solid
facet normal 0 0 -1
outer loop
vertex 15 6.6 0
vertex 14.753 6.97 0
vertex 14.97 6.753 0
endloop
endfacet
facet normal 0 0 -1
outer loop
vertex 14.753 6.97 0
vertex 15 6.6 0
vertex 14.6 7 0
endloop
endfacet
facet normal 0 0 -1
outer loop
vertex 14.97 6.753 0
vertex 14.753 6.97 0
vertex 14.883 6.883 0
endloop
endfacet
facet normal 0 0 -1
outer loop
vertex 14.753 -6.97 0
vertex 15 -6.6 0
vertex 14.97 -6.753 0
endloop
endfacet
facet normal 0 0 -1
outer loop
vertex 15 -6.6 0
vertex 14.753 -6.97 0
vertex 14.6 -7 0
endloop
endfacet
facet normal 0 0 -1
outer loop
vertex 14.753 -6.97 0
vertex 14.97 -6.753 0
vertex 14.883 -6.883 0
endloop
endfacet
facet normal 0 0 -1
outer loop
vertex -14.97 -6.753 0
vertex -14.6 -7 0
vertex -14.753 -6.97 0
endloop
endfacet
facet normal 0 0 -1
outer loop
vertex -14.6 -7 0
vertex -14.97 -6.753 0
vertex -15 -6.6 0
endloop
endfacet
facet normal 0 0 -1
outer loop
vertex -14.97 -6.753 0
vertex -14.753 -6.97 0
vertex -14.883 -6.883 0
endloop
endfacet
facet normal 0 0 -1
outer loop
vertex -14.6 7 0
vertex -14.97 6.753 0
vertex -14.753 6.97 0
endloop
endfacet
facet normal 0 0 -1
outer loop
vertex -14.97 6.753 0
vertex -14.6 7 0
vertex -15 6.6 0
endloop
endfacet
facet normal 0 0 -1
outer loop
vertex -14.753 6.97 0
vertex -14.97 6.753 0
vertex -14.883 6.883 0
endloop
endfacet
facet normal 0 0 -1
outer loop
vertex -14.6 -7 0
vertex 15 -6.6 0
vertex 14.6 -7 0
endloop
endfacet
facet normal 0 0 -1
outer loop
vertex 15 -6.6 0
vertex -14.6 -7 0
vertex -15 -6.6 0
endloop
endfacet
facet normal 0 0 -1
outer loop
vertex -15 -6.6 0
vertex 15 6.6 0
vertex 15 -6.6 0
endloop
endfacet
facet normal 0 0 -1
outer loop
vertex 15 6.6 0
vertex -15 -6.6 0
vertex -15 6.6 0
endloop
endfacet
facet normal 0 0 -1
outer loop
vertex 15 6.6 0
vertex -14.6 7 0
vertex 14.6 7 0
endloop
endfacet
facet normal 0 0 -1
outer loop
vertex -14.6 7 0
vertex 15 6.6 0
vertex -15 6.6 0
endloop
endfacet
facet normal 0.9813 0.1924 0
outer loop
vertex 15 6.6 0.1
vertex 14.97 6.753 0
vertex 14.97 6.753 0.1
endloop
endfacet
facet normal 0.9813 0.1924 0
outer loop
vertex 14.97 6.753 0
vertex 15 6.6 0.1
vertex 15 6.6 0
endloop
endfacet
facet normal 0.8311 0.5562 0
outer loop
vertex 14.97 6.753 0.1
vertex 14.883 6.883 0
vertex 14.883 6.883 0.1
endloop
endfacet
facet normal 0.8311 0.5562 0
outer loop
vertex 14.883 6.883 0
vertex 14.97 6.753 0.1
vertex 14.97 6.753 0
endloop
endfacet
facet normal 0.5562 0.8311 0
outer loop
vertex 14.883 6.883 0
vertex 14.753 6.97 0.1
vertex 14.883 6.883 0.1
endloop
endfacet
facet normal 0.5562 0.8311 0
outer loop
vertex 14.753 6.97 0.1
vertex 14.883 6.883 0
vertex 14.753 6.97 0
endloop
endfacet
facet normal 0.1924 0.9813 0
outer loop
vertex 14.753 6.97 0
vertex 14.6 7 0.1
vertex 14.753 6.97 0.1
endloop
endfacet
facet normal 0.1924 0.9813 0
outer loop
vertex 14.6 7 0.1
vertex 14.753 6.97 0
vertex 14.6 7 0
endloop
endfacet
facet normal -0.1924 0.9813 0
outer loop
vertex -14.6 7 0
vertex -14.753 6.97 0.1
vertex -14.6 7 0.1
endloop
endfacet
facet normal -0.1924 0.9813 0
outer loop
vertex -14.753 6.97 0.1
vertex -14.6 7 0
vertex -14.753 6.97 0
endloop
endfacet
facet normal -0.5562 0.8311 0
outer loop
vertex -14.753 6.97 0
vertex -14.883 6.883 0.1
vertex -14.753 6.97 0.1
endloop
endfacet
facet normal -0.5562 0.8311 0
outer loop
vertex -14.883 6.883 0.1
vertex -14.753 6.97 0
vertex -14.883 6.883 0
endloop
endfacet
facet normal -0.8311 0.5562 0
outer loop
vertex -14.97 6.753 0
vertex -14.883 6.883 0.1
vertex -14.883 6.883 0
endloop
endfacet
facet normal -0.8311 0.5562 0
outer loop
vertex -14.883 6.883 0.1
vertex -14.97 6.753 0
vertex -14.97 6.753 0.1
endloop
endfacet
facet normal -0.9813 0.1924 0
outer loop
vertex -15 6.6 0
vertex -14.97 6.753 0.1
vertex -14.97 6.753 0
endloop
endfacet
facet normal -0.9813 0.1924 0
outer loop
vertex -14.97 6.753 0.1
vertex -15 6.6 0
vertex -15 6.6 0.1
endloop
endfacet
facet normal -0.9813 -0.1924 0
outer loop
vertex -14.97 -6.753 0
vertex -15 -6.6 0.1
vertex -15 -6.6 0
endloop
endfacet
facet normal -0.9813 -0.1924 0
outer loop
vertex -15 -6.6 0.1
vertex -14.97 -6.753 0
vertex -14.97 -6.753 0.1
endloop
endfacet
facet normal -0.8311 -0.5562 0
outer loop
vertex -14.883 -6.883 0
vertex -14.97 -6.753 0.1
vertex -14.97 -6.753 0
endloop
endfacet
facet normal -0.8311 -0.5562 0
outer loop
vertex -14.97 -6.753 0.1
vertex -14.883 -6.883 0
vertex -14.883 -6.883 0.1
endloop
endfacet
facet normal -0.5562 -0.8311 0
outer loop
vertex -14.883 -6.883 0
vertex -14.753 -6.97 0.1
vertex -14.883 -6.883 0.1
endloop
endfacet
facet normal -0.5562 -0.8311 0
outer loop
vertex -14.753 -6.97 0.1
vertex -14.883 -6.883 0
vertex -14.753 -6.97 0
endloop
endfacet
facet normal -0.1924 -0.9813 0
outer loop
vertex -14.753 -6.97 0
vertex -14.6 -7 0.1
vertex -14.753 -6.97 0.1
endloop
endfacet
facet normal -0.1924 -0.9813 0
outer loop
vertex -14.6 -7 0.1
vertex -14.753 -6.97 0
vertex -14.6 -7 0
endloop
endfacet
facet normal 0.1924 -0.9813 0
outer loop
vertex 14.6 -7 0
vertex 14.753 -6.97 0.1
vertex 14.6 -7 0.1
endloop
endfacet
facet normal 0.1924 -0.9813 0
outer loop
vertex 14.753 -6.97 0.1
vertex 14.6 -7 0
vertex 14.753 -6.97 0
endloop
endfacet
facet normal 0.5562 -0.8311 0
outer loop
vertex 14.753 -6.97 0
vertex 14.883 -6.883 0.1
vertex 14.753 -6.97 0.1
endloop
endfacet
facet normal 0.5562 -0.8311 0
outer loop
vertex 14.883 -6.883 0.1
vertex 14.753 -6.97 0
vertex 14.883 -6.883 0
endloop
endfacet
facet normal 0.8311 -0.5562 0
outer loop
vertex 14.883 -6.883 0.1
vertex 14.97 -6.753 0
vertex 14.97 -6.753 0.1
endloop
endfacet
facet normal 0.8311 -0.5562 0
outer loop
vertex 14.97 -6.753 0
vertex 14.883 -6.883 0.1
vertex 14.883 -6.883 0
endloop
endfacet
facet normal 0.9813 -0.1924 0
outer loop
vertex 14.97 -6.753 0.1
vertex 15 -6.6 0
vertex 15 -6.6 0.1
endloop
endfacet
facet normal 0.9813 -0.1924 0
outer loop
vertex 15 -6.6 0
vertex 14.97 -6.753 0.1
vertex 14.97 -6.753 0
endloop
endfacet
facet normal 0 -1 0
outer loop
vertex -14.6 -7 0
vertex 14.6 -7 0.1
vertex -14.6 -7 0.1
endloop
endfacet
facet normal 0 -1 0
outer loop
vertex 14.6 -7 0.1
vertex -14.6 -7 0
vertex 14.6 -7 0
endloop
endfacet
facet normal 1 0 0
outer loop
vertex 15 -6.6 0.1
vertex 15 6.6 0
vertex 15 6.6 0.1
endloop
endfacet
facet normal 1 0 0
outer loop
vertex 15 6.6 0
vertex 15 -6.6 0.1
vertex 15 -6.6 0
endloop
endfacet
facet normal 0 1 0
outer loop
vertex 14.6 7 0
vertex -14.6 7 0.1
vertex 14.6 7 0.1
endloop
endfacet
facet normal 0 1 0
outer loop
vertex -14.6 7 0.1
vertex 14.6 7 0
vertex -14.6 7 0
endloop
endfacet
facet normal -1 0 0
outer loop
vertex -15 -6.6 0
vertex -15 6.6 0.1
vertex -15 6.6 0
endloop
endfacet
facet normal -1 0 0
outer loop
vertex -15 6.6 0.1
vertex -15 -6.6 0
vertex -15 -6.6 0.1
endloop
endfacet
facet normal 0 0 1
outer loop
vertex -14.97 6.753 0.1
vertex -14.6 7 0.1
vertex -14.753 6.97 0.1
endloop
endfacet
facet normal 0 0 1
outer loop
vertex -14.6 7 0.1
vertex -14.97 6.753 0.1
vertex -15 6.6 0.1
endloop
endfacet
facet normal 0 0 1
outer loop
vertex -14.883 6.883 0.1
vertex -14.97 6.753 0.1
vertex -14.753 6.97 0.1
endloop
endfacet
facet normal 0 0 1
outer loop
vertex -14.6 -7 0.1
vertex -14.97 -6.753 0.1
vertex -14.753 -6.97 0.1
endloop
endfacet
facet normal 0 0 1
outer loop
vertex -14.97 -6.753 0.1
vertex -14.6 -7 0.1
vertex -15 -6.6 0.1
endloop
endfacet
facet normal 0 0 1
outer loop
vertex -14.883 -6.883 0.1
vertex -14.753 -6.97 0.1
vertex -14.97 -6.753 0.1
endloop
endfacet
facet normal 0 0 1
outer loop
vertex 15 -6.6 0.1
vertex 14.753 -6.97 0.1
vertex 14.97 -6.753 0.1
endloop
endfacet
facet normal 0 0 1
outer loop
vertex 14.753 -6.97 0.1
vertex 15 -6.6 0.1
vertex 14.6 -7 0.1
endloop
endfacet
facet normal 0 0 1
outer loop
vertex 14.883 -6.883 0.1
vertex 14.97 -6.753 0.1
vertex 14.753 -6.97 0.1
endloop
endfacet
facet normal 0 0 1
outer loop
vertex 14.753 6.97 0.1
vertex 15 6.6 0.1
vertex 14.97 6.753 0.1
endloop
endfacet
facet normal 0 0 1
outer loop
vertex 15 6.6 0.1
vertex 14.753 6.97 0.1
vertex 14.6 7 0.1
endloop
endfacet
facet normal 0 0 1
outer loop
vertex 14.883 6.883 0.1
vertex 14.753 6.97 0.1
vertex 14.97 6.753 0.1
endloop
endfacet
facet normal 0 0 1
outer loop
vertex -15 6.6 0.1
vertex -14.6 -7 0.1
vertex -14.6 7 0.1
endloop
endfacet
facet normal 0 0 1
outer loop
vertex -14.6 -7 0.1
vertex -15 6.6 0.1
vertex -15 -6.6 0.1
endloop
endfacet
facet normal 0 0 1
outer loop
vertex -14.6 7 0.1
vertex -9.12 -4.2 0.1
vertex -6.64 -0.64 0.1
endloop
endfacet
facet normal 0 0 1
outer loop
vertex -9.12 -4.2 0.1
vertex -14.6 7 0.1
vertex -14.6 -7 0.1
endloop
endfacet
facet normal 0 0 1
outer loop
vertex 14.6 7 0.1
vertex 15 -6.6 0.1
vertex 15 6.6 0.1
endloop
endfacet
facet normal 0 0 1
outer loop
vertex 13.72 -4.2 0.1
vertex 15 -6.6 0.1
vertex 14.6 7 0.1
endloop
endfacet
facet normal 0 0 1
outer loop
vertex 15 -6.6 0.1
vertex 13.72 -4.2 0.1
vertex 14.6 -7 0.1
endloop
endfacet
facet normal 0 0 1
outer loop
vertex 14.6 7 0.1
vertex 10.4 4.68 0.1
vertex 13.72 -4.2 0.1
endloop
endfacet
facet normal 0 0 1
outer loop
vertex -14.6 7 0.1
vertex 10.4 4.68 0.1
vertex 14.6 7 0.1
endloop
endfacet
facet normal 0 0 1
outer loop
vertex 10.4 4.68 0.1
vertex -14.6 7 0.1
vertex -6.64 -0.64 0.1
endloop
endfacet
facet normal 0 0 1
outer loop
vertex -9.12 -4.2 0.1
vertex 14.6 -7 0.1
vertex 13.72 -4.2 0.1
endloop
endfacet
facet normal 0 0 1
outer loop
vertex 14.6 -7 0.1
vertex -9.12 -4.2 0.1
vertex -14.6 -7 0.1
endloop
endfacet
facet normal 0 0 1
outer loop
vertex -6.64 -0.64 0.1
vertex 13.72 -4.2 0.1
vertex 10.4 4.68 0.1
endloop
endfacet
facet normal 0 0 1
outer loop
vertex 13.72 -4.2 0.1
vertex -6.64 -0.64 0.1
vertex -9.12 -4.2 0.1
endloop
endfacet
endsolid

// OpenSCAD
// file: ../p/1-4cyli.scad
use <../lib.scad>
function ldraw_lib__1_4cyli() = [
// 0 Cylinder 0.25
// 0 Name: 1-4cyli.dat
// 0 Author: James Jessiman
// 0 !LDRAW_ORG Primitive UPDATE 2012-01
// 0 !LICENSE Licensed under CC BY 4.0 : see CAreadme.txt
// 
// 0 BFC CERTIFY CCW
  [0,"BFC","CERTIFY"],
  [0,"BFC","CCW"],
// 
// 0 !HISTORY 2002-03-23 [sbliss] Added BFC statement.
// 0 !HISTORY 2002-04-25 [PTadmin] Official Update 2002-02
// 0 !HISTORY 2007-06-22 [PTadmin] Header formatted for Contributor Agreement
// 0 !HISTORY 2008-07-01 [PTadmin] Official Update 2008-01
// 0 !HISTORY 2012-02-16 [Philo] Changed to CCW
// 0 !HISTORY 2012-03-30 [PTadmin] Official Update 2012-01
// 
// 
// 4 16 1 1 0 0.9239 1 0.3827 0.9239 0 0.3827 1 0 0
  [4,16,1,1,0,0.9239,1,0.3827,0.9239,0,0.3827,1,0,0],
// 5 24 1 0 0 1 1 0 0.9239 0 0.3827 1 0 -1
  [5,24,1,0,0,1,1,0,0.9239,0,0.3827,1,0,-1],
// 4 16 0.9239 1 0.3827 0.7071 1 0.7071 0.7071 0 0.7071 0.9239 0 0.3827
  [4,16,0.9239,1,0.3827,0.7071,1,0.7071,0.7071,0,0.7071,0.9239,0,0.3827],
// 5 24 0.9239 0 0.3827 0.9239 1 0.3827 0.7071 0 0.7071 1 0 0
  [5,24,0.9239,0,0.3827,0.9239,1,0.3827,0.7071,0,0.7071,1,0,0],
// 4 16 0.7071 1 0.7071 0.3827 1 0.9239 0.3827 0 0.9239 0.7071 0 0.7071
  [4,16,0.7071,1,0.7071,0.3827,1,0.9239,0.3827,0,0.9239,0.7071,0,0.7071],
// 5 24 0.7071 0 0.7071 0.7071 1 0.7071 0.3827 0 0.9239 0.9239 0 0.3827
  [5,24,0.7071,0,0.7071,0.7071,1,0.7071,0.3827,0,0.9239,0.9239,0,0.3827],
// 4 16 0.3827 1 0.9239 0 1 1 0 0 1 0.3827 0 0.9239
  [4,16,0.3827,1,0.9239,0,1,1,0,0,1,0.3827,0,0.9239],
// 5 24 0.3827 0 0.9239 0.3827 1 0.9239 0 0 1 0.7071 0 0.7071
  [5,24,0.3827,0,0.9239,0.3827,1,0.9239,0,0,1,0.7071,0,0.7071],
// 5 24 0 0 1 0 1 1 0.3827 0 0.9239 -1 0 1
  [5,24,0,0,1,0,1,1,0.3827,0,0.9239,-1,0,1],
];
module ldraw_lib__1_4cyli(step=0, col=false, unit=2/5, alt=false, line=0.2, solid=!$preview)
    makepoly(ldraw_lib__1_4cyli(), step=step, col=col, unit=unit, alt=alt, line=line, solid=solid);
ldraw_lib__1_4cyli(line=0.2);
// file: ../p/1-4chrd.scad
use <../lib.scad>
function ldraw_lib__1_4chrd() = [
// 0 Chord 0.25
// 0 Name: 1-4chrd.dat
// 0 Author: Max Martin Richter [MMR1988]
// 0 !LDRAW_ORG Primitive UPDATE 2023-05
// 0 !LICENSE Licensed under CC BY 4.0 : see CAreadme.txt
// 
// 0 BFC CERTIFY CCW
  [0,"BFC","CERTIFY"],
  [0,"BFC","CCW"],
// 
// 0 !HISTORY 2004-04-22 [PTadmin] Official Update 2004-02
// 0 !HISTORY 2007-10-09 [PTadmin] Header formatted for Contributor Agreement
// 0 !HISTORY 2008-07-01 [PTadmin] Official Update 2008-01
// 0 !HISTORY 2012-08-02 [MMR1988] Re-creation with PrimGen2 and Rectifier
// 0 !HISTORY 2012-08-09 [PTadmin] Official Update 2012-02
// 0 !HISTORY 2023-10-27 [OrionP] Change author to MMR1988 from hafhead
// 0 !HISTORY 2023-10-31 [OrionP] Official Update 2023-05
// 
// 4 16 0.9239 0 0.3827 0.3827 0 0.9239 0 0 1 1 0 0
  [4,16,0.9239,0,0.3827,0.3827,0,0.9239,0,0,1,1,0,0],
// 3 16 0.7071 0 0.7071 0.3827 0 0.9239 0.9239 0 0.3827
  [3,16,0.7071,0,0.7071,0.3827,0,0.9239,0.9239,0,0.3827],
];
module ldraw_lib__1_4chrd(step=0, col=false, unit=2/5, alt=false, line=0.2, solid=!$preview)
    makepoly(ldraw_lib__1_4chrd(), step=step, col=col, unit=unit, alt=alt, line=line, solid=solid);
ldraw_lib__1_4chrd(line=0.2);
// main file
use <../lib.scad>
use <../p/1-4chrd.scad>
use <../p/1-4cyli.scad>
function ldraw_lib__6347356m() = [
// 0 Sticker  1.7 x  3.7 with Bright Light Orange Trapezoid Left
// 0 Name: 6347356m.dat
// 0 Author: Evert-Jan Boer [ejboer]
// 0 !LDRAW_ORG Part UPDATE 2024-06
// 0 !LICENSE Licensed under CC BY 4.0 : see CAreadme.txt
// 
// 0 BFC CERTIFY CCW
  [0,"BFC","CERTIFY"],
  [0,"BFC","CCW"],
// 
// 0 !KEYWORDS Republic Gunship, Set 75309, Star Wars
// 
// 0 !HISTORY 2024-07-29 [OrionP] Official Update 2024-06
// 
// 1 16 36.5 0 16.5 1 0 0 0 -1 0 0 0 1 1-4chrd.dat
  [1,16,36.5,0,16.5,1,0,0,0,-1,0,0,0,1, ldraw_lib__1_4chrd()],
// 1 16 36.5 0 -16.5 0 0 1 0 -1 0 -1 0 0 1-4chrd.dat
  [1,16,36.5,0,-16.5,0,0,1,0,-1,0,-1,0,0, ldraw_lib__1_4chrd()],
// 1 16 -36.5 0 -16.5 -1 0 0 0 -1 0 0 0 -1 1-4chrd.dat
  [1,16,-36.5,0,-16.5,-1,0,0,0,-1,0,0,0,-1, ldraw_lib__1_4chrd()],
// 1 16 -36.5 0 16.5 0 0 -1 0 -1 0 1 0 0 1-4chrd.dat
  [1,16,-36.5,0,16.5,0,0,-1,0,-1,0,1,0,0, ldraw_lib__1_4chrd()],
// 4 16 36.5 0 -17.5 -36.5 0 -17.5 -37.5 0 -16.5 37.5 0 -16.5
  [4,16,36.5,0,-17.5,-36.5,0,-17.5,-37.5,0,-16.5,37.5,0,-16.5],
// 4 16 37.5 0 16.5 37.5 0 -16.5 -37.5 0 -16.5 -37.5 0 16.5
  [4,16,37.5,0,16.5,37.5,0,-16.5,-37.5,0,-16.5,-37.5,0,16.5],
// 4 16 37.5 0 16.5 -37.5 0 16.5 -36.5 0 17.5 36.5 0 17.5
  [4,16,37.5,0,16.5,-37.5,0,16.5,-36.5,0,17.5,36.5,0,17.5],
// 
// 1 16 36.5 -.25 16.5 1 0 0 0 .25 0 0 0 1 1-4cyli.dat
  [1,16,36.5,-.25,16.5,1,0,0,0,.25,0,0,0,1, ldraw_lib__1_4cyli()],
// 1 16 -36.5 -.25 16.5 0 0 -1 0 .25 0 1 0 0 1-4cyli.dat
  [1,16,-36.5,-.25,16.5,0,0,-1,0,.25,0,1,0,0, ldraw_lib__1_4cyli()],
// 1 16 -36.5 -.25 -16.5 -1 0 0 0 .25 0 0 0 -1 1-4cyli.dat
  [1,16,-36.5,-.25,-16.5,-1,0,0,0,.25,0,0,0,-1, ldraw_lib__1_4cyli()],
// 1 16 36.5 -.25 -16.5 0 0 1 0 .25 0 -1 0 0 1-4cyli.dat
  [1,16,36.5,-.25,-16.5,0,0,1,0,.25,0,-1,0,0, ldraw_lib__1_4cyli()],
// 4 16 36.5 -.25 -17.5 -36.5 -.25 -17.5 -36.5 0 -17.5 36.5 0 -17.5
  [4,16,36.5,-.25,-17.5,-36.5,-.25,-17.5,-36.5,0,-17.5,36.5,0,-17.5],
// 4 16 37.5 -.25 16.5 37.5 -.25 -16.5 37.5 0 -16.5 37.5 0 16.5
  [4,16,37.5,-.25,16.5,37.5,-.25,-16.5,37.5,0,-16.5,37.5,0,16.5],
// 4 16 -36.5 -.25 17.5 36.5 -.25 17.5 36.5 0 17.5 -36.5 0 17.5
  [4,16,-36.5,-.25,17.5,36.5,-.25,17.5,36.5,0,17.5,-36.5,0,17.5],
// 4 16 -37.5 -.25 -16.5 -37.5 -.25 16.5 -37.5 0 16.5 -37.5 0 -16.5
  [4,16,-37.5,-.25,-16.5,-37.5,-.25,16.5,-37.5,0,16.5,-37.5,0,-16.5],
// 
// 1 16 -36.5 -.25 16.5 0 0 -1 0 1 0 1 0 0 1-4chrd.dat
  [1,16,-36.5,-.25,16.5,0,0,-1,0,1,0,1,0,0, ldraw_lib__1_4chrd()],
// 1 16 -36.5 -.25 -16.5 -1 0 0 0 1 0 0 0 -1 1-4chrd.dat
  [1,16,-36.5,-.25,-16.5,-1,0,0,0,1,0,0,0,-1, ldraw_lib__1_4chrd()],
// 1 16 36.5 -.25 -16.5 0 0 1 0 1 0 -1 0 0 1-4chrd.dat
  [1,16,36.5,-.25,-16.5,0,0,1,0,1,0,-1,0,0, ldraw_lib__1_4chrd()],
// 1 16 36.5 -.25 16.5 1 0 0 0 1 0 0 0 1 1-4chrd.dat
  [1,16,36.5,-.25,16.5,1,0,0,0,1,0,0,0,1, ldraw_lib__1_4chrd()],
// 4 16 -36.5 -.25 -17.5 -36.5 -.25 17.5 -37.5 -.25 16.5 -37.5 -.25 -16.5
  [4,16,-36.5,-.25,-17.5,-36.5,-.25,17.5,-37.5,-.25,16.5,-37.5,-.25,-16.5],
// 4 16 -16.6 -.25 -1.6 -36.5 -.25 17.5 -36.5 -.25 -17.5 -22.8 -.25 -10.5
  [4,16,-16.6,-.25,-1.6,-36.5,-.25,17.5,-36.5,-.25,-17.5,-22.8,-.25,-10.5],
// 3 16 36.5 -.25 17.5 37.5 -.25 -16.5 37.5 -.25 16.5
  [3,16,36.5,-.25,17.5,37.5,-.25,-16.5,37.5,-.25,16.5],
// 4 16 34.3 -.25 -10.5 36.5 -.25 -17.5 37.5 -.25 -16.5 36.5 -.25 17.5
  [4,16,34.3,-.25,-10.5,36.5,-.25,-17.5,37.5,-.25,-16.5,36.5,-.25,17.5],
// 3 16 36.5 -.25 17.5 26 -.25 11.7 34.3 -.25 -10.5
  [3,16,36.5,-.25,17.5,26,-.25,11.7,34.3,-.25,-10.5],
// 4 16 36.5 -.25 17.5 -36.5 -.25 17.5 -16.6 -.25 -1.6 26 -.25 11.7
  [4,16,36.5,-.25,17.5,-36.5,-.25,17.5,-16.6,-.25,-1.6,26,-.25,11.7],
// 4 16 -22.8 -.25 -10.5 -36.5 -.25 -17.5 36.5 -.25 -17.5 34.3 -.25 -10.5
  [4,16,-22.8,-.25,-10.5,-36.5,-.25,-17.5,36.5,-.25,-17.5,34.3,-.25,-10.5],
// 
// 0 BFC NOCLIP
  [0,"BFC","NOCLIP"],
// 4 191 26 -.25 11.7 -16.6 -.25 -1.6 -22.8 -.25 -10.5 34.3 -.25 -10.5
  [4,191,26,-.25,11.7,-16.6,-.25,-1.6,-22.8,-.25,-10.5,34.3,-.25,-10.5],
];
module ldraw_lib__6347356m(step=0, col=false, unit=2/5, alt=false, line=0.2, solid=!$preview)
    makepoly(ldraw_lib__6347356m(), step=step, col=col, unit=unit, alt=alt, line=line, solid=solid);
ldraw_lib__6347356m(line=0.2);
